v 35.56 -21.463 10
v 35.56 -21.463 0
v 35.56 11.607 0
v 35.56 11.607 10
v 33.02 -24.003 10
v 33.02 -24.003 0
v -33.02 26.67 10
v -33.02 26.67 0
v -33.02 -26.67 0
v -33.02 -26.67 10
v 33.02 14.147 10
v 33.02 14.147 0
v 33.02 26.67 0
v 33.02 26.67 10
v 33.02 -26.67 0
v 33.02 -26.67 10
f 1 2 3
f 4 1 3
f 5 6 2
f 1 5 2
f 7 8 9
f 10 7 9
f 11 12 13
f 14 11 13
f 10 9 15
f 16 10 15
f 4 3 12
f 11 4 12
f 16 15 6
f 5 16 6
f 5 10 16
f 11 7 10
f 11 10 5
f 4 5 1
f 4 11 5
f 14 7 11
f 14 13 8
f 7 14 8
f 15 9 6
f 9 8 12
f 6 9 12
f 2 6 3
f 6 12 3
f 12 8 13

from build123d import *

# Parameters (mm, degrees)
F1_DEPTH = 10


with BuildPart() as f1:
    # F0 (on Top) → F1 (new body)
    with BuildSketch(Plane.XY):
        Polygon((33.02, 26.67), (-33.02, 26.67), (-33.02, -26.67), (33.02, -26.67), (33.02, -24.003), (33.02, 14.147), align=None)
        Polygon((35.56, 11.607), (33.02, 14.147), (33.02, -24.003), (35.56, -21.463), align=None)
    extrude(amount=F1_DEPTH)


solid = f1.part
